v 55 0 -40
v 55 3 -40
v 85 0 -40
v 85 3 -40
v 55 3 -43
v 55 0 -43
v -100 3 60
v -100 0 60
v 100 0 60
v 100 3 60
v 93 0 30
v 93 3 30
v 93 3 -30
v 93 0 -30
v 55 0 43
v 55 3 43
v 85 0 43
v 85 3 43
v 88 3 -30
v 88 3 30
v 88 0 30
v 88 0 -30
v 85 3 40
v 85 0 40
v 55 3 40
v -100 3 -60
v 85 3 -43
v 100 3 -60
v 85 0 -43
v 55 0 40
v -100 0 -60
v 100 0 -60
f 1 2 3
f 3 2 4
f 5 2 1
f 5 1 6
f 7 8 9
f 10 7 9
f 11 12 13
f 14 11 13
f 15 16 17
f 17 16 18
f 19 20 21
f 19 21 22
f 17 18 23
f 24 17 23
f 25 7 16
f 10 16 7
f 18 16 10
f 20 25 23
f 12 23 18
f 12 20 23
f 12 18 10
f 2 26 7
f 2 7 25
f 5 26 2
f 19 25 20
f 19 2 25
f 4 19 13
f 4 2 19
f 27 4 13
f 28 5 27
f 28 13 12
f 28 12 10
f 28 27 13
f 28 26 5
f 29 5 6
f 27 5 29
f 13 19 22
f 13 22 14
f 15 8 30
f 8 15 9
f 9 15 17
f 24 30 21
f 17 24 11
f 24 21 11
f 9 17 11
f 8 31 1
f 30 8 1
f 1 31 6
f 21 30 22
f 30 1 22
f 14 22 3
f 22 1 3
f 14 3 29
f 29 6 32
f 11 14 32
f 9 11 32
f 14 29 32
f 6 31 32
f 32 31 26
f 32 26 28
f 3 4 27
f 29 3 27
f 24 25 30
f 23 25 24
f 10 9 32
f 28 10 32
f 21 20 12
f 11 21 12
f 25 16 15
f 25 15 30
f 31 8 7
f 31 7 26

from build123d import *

# Parameters (mm, degrees)
SKETCH1_W           = 200
SKETCH1_H           = 120
BOSS_EXTRUDE1_DEPTH = 3
SKETCH2_W           = 5
SKETCH2_H           = 60
CUT_EXTRUDE1_DEPTH  = 117.657618697
SKETCH3_W           = 30
SKETCH3_H           = 3
CUT_EXTRUDE2_DEPTH  = 117.657618697


with BuildPart() as part:
    # Sketch1 → Boss-Extrude1 (new body)
    with BuildSketch(Plane(origin=(0, 0, 0), x_dir=(1, 0, 0), z_dir=(0, 1, 0))):
        Rectangle(SKETCH1_W, SKETCH1_H)
    extrude(amount=BOSS_EXTRUDE1_DEPTH)

    # Sketch2 → Cut-Extrude1 (cut, through all)
    with BuildSketch(Plane(origin=(0, 3, 0), x_dir=(1, 0, 0), z_dir=(0, 1, 0))):
        with Locations((90.5, 0)):
            Rectangle(SKETCH2_W, SKETCH2_H)
    extrude(amount=-CUT_EXTRUDE1_DEPTH, mode=Mode.SUBTRACT)

    # Sketch3 → Cut-Extrude2 (cut, through all)
    with BuildSketch(Plane(origin=(0, 3, 0), x_dir=(1, 0, 0), z_dir=(0, 1, 0))):
        with Locations((70, 41.5)):
            Rectangle(SKETCH3_W, SKETCH3_H)
        with Locations((70, -41.5)):
            Rectangle(SKETCH3_W, SKETCH3_H)
    extrude(amount=-CUT_EXTRUDE2_DEPTH, mode=Mode.SUBTRACT)


solid = part.part
